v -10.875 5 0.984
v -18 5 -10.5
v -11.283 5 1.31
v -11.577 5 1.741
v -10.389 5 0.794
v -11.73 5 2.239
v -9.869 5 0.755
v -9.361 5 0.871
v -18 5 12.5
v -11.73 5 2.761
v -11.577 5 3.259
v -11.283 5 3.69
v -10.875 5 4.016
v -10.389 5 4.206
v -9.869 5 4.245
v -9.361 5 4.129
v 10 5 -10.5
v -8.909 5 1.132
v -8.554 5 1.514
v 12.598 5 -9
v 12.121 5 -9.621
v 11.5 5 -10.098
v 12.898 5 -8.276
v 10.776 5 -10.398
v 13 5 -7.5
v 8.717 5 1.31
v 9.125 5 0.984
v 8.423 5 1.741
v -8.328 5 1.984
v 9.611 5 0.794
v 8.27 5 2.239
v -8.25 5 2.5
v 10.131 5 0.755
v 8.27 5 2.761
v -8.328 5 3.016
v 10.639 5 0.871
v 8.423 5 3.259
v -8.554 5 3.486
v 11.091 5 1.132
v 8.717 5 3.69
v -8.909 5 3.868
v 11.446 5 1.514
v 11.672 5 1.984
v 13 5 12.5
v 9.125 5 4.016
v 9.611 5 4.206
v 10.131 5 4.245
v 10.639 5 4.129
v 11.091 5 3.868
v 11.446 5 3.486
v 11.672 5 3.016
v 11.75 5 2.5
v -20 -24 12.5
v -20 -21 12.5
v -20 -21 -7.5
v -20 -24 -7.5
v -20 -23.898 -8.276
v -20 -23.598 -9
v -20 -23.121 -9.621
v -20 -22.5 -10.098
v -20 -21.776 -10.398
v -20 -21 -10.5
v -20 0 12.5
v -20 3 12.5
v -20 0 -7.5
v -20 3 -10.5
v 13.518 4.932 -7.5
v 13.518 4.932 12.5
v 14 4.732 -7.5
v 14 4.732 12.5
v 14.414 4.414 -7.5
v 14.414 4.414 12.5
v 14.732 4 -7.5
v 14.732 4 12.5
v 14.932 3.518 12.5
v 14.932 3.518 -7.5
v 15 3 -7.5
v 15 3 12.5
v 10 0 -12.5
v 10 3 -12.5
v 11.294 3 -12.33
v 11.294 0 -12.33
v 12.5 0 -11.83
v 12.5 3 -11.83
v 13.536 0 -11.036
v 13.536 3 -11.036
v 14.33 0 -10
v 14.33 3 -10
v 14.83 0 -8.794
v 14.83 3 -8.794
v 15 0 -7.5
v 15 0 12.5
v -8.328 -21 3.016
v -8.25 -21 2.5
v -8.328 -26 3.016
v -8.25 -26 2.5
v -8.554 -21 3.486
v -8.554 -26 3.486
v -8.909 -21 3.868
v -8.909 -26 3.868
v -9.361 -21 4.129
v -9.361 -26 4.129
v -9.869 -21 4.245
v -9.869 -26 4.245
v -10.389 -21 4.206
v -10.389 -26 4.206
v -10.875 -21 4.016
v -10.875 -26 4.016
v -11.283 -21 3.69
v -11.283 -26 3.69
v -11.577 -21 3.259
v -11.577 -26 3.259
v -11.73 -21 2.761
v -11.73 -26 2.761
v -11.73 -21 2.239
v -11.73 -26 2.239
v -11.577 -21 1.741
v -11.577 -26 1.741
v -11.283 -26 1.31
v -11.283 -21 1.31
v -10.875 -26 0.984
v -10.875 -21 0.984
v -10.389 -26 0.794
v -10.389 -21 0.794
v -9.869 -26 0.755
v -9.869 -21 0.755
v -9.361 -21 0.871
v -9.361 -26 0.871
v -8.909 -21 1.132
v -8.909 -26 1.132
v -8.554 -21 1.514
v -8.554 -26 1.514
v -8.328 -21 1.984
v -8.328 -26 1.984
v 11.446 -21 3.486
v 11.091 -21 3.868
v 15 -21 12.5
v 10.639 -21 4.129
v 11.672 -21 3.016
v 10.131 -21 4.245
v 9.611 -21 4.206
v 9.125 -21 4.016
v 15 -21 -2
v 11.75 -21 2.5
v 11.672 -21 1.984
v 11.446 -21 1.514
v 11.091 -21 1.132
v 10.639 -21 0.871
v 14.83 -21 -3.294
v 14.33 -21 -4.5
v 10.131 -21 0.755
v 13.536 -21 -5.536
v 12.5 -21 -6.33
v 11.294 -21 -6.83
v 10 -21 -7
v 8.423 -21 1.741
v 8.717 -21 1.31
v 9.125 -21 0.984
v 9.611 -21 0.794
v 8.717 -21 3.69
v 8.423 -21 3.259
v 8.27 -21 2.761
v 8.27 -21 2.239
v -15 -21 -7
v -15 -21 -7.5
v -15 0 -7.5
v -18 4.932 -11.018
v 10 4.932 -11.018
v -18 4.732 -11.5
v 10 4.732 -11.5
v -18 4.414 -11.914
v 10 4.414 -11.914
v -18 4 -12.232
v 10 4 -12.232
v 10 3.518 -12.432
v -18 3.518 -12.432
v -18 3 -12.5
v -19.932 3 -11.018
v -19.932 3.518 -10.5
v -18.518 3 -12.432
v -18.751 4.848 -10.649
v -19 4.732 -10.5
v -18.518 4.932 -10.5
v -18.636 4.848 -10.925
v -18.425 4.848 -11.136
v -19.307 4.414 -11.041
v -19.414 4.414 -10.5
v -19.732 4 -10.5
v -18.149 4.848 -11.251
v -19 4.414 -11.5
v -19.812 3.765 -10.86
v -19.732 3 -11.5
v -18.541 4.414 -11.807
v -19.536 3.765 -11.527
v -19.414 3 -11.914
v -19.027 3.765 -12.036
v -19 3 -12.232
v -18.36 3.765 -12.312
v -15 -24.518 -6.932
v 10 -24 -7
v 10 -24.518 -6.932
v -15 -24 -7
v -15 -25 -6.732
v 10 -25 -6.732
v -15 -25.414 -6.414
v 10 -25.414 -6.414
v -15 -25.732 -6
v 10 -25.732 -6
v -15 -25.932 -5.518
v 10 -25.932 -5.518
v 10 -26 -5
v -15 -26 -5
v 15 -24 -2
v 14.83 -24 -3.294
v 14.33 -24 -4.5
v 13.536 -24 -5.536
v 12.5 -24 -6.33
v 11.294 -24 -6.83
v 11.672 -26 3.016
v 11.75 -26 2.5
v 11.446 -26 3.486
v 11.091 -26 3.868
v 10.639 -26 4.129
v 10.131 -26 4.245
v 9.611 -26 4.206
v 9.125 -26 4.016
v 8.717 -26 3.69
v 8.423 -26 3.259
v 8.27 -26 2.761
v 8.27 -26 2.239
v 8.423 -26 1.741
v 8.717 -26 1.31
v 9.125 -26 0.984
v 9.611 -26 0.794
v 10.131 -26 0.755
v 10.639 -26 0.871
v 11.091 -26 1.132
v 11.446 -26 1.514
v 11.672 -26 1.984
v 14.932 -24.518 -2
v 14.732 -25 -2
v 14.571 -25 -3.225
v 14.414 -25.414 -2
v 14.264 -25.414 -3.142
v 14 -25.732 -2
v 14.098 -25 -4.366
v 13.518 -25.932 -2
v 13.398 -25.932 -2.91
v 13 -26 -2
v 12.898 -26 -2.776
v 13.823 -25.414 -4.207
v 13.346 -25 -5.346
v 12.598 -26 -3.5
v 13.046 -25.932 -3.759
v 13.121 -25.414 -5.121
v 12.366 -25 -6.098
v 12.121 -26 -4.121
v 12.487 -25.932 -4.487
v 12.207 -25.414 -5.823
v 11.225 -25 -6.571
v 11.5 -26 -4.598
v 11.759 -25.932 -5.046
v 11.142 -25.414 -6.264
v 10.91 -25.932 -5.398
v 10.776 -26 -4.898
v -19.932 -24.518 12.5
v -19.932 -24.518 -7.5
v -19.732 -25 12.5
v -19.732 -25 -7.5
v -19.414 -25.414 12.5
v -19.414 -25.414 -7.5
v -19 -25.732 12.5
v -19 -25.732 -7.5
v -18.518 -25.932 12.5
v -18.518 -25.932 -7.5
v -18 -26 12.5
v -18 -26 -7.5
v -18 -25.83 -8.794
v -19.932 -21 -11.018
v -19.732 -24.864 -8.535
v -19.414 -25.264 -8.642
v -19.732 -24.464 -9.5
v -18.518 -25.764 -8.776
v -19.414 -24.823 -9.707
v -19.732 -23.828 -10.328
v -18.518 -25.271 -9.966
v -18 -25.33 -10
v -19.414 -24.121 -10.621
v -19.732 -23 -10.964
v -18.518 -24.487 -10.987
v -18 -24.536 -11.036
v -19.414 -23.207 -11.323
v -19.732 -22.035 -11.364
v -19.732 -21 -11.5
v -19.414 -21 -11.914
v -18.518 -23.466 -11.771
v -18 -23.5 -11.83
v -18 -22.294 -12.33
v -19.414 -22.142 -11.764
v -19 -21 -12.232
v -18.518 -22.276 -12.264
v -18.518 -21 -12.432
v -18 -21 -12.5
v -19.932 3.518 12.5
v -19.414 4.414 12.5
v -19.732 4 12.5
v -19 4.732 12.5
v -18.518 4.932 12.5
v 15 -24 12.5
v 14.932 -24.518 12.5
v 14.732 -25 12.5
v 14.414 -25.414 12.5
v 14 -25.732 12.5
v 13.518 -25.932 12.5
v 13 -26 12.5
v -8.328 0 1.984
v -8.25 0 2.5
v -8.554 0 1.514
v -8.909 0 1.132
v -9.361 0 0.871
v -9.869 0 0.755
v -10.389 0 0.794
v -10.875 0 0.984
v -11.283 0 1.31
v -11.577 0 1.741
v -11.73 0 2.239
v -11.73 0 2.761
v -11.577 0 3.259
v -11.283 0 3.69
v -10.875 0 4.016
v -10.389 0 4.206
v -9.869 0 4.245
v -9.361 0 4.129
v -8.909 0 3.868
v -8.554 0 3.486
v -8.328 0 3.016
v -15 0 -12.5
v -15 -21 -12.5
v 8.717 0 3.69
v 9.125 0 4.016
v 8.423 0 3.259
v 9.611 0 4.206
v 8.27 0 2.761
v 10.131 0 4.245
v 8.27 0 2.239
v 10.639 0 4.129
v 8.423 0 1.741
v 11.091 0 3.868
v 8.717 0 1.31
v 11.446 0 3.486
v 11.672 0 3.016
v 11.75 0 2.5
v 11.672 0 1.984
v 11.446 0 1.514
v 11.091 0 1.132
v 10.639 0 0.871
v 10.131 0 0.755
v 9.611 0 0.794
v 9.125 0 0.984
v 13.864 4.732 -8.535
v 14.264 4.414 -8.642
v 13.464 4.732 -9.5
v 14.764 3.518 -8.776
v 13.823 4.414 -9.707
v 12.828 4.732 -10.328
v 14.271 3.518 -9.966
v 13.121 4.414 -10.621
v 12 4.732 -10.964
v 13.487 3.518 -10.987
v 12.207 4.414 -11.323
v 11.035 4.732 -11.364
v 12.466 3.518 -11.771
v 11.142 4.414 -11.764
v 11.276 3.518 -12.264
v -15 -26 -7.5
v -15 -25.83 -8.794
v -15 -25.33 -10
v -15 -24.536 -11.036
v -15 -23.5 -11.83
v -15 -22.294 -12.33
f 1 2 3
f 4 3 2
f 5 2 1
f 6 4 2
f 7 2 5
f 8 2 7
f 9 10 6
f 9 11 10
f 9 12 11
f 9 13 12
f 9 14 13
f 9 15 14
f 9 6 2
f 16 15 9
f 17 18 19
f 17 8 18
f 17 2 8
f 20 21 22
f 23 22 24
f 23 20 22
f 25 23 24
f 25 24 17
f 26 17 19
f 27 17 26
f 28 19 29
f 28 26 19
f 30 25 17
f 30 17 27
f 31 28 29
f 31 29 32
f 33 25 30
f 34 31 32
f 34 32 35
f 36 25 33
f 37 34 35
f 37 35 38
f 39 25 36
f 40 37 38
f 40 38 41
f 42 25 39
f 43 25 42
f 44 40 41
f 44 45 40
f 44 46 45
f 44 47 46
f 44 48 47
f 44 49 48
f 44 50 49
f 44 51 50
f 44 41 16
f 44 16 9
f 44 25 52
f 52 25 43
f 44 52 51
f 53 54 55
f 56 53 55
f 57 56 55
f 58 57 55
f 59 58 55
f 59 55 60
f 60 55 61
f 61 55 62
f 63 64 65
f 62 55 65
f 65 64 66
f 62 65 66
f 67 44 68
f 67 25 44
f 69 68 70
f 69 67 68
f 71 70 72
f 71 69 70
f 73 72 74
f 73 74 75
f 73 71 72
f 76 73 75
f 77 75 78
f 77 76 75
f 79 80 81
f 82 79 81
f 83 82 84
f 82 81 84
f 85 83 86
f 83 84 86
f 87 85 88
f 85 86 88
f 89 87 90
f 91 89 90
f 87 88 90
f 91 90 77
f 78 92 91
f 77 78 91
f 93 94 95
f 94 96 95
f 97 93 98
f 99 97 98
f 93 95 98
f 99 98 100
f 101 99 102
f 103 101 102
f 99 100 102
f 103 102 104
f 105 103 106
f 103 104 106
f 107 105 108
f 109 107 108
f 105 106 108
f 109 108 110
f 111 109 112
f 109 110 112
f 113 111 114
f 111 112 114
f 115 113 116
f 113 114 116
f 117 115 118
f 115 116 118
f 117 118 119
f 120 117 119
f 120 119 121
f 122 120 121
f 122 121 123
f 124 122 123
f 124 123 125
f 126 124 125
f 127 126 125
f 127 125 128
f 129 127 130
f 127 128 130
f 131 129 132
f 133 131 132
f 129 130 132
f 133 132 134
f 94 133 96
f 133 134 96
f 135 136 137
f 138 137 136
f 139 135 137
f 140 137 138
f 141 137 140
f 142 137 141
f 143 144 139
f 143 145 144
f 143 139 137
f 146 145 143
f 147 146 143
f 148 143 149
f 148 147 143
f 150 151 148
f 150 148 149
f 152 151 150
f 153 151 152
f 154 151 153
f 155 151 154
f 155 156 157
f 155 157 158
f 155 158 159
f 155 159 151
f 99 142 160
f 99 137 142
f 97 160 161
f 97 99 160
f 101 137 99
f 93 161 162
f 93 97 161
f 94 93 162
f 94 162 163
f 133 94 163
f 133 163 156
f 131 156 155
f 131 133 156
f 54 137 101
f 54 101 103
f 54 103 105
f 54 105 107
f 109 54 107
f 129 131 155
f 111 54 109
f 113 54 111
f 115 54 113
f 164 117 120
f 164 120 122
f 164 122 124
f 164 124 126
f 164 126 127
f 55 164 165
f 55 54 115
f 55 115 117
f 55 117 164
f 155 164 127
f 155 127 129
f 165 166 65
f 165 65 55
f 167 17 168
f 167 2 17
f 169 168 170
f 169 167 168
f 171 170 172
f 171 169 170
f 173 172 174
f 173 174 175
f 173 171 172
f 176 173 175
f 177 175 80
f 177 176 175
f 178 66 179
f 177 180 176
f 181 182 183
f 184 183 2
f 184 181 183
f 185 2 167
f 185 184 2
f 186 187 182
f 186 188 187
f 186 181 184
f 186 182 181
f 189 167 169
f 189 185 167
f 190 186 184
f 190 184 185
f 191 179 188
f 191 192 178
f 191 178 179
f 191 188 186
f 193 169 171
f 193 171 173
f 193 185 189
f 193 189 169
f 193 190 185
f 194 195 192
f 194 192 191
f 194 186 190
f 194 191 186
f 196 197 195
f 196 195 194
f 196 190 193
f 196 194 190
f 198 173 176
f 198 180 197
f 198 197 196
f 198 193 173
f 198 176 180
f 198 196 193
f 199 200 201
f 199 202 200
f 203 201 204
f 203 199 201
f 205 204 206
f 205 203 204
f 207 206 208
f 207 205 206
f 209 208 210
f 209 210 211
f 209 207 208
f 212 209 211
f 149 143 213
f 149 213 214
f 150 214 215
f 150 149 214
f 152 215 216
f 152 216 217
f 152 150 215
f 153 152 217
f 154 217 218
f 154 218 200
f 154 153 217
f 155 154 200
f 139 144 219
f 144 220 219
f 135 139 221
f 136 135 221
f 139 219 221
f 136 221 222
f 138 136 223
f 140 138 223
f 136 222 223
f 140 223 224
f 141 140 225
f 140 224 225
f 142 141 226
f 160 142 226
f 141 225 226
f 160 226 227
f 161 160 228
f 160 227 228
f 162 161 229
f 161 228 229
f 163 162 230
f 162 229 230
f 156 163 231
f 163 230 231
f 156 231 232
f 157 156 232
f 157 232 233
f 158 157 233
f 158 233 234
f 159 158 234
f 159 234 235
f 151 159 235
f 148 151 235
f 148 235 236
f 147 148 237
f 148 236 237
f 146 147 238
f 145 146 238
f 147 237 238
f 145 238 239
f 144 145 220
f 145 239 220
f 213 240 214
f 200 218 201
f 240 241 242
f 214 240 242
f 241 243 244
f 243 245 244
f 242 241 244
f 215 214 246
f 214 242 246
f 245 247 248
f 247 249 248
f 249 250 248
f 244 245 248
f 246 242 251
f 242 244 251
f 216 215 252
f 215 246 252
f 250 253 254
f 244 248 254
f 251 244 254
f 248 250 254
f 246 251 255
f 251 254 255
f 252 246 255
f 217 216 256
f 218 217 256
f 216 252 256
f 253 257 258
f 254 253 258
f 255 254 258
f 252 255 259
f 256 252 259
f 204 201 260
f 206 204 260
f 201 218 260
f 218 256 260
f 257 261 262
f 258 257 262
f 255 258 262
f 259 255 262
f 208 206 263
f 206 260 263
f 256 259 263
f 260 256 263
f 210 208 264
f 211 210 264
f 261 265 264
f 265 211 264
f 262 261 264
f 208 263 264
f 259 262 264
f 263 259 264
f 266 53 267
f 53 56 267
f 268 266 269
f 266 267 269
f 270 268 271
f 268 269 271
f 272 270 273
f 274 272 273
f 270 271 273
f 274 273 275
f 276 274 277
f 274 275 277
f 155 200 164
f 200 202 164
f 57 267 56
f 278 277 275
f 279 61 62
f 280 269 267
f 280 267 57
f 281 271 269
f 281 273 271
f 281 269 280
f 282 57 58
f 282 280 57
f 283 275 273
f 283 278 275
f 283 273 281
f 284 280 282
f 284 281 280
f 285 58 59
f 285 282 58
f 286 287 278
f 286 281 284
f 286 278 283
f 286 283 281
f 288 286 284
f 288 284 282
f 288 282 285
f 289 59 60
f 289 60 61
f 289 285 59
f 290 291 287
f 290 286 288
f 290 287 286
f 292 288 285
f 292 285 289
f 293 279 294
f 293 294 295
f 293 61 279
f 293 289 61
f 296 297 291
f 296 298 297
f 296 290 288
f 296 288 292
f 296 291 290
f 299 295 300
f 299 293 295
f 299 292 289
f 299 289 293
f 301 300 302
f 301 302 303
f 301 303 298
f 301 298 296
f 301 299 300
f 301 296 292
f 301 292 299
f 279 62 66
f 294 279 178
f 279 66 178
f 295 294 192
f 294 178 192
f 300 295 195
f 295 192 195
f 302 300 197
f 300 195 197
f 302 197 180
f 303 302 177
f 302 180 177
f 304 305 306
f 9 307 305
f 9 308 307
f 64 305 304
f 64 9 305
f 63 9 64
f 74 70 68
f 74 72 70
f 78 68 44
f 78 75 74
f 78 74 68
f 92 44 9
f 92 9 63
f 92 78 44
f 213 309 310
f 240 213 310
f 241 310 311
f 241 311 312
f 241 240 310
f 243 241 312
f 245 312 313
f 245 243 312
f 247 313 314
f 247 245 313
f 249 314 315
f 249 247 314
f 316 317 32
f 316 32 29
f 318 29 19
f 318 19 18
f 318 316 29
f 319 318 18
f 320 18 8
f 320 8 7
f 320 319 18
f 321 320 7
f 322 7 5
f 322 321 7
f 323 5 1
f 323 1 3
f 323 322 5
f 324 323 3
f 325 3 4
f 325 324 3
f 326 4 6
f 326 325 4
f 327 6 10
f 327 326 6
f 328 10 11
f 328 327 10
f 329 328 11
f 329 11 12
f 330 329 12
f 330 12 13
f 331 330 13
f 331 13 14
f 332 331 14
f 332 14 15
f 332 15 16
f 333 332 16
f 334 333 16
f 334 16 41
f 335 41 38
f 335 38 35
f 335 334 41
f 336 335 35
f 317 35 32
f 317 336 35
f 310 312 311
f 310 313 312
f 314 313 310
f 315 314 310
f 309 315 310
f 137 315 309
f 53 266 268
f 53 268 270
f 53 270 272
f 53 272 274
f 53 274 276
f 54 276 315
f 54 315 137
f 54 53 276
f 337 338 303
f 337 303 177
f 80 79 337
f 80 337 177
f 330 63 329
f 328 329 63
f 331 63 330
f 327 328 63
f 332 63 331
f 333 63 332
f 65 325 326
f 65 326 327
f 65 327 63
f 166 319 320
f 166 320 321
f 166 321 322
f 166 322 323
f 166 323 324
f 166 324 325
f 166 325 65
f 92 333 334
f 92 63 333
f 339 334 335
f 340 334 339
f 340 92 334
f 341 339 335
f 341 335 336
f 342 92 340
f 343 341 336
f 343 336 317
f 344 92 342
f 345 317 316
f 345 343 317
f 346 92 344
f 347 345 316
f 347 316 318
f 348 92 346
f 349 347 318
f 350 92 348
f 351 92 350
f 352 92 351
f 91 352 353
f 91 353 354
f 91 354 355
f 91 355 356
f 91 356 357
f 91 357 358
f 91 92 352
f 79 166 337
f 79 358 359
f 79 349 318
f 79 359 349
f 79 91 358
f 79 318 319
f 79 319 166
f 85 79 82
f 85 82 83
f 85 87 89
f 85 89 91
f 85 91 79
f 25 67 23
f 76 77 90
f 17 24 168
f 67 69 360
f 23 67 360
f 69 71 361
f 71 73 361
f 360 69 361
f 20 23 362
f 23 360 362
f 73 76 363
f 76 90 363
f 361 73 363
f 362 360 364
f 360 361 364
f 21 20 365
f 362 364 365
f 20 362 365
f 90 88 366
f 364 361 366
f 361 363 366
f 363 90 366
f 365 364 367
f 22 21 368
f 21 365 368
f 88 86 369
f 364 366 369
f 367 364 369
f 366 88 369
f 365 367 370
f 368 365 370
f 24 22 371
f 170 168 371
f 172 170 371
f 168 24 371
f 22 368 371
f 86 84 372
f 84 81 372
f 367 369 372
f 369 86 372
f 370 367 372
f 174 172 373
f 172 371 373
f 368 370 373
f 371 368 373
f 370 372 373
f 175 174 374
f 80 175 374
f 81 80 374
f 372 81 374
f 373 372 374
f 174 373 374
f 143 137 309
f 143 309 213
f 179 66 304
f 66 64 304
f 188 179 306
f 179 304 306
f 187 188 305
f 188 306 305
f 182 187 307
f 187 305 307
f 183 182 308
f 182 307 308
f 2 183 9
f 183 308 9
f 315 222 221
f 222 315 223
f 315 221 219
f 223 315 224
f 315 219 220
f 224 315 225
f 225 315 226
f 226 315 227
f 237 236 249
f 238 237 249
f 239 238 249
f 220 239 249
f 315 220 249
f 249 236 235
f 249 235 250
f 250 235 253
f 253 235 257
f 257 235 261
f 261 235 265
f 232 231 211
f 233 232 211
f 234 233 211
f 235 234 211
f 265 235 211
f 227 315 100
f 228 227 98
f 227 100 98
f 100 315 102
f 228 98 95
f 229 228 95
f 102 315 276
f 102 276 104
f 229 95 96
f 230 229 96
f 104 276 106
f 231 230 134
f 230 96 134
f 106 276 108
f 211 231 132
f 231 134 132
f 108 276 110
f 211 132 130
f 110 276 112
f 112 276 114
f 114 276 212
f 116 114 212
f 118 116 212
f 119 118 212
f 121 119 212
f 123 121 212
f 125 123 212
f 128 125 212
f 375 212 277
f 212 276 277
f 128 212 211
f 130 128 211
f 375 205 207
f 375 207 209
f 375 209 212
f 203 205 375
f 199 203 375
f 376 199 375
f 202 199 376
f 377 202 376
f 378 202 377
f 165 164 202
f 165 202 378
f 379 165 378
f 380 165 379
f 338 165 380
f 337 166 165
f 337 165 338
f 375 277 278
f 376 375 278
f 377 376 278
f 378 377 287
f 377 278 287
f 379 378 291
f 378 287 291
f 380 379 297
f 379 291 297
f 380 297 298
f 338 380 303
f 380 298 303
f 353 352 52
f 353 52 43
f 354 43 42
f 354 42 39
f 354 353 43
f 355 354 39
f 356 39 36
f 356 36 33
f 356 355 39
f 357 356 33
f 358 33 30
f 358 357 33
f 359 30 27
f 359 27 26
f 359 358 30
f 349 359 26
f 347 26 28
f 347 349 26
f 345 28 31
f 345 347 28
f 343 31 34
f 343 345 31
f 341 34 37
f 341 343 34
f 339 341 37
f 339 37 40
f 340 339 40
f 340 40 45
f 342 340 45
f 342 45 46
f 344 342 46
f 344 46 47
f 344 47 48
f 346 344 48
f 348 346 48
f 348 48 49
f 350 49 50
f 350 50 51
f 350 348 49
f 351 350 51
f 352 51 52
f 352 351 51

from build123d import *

# Parameters (mm, degrees)
SKETCH1_W           = 30
SKETCH1_H           = 25
SKETCH1_R           = 1.75
BOSS_EXTRUDE1_DEPTH = 5
BOSS_EXTRUDE2_DEPTH = 5
SKETCH3_W           = 19.5
SKETCH3_H           = 5
BOSS_EXTRUDE3_DEPTH = 30
SKETCH4_R           = 1.75
CUT_EXTRUDE1_DEPTH  = 32
FILLET1_R           = 5
FILLET2_R           = 2


with BuildPart() as part:
    # Sketch1 → Boss-Extrude1 (new body)
    with BuildSketch(Plane(origin=(0, 0, 0), x_dir=(1, 0, 0), z_dir=(0, 1, 0))):
        Rectangle(SKETCH1_W, SKETCH1_H)
        with Locations((-10, -2.5)):
            Circle(SKETCH1_R, mode=Mode.SUBTRACT)
        with Locations((10, -2.5)):
            Circle(SKETCH1_R, mode=Mode.SUBTRACT)
    extrude(amount=BOSS_EXTRUDE1_DEPTH)

    # Sketch2 → Boss-Extrude2 (add)
    with BuildSketch(Plane.ZY.offset(15)):
        Polygon((-12.5, 5), (12.5, 5), (12.5, 0), (-7.5, 0), (-7.5, -21), (12.5, -21), (12.5, -26), (-12.5, -26), align=None)
    extrude(amount=BOSS_EXTRUDE2_DEPTH)

    # Sketch3 → Boss-Extrude3 (add)
    with BuildSketch(Plane(origin=(-15, 0, 0), x_dir=(0, 0, -1), z_dir=(1, 0, 0))):
        with Locations((-2.75, -23.5)):
            Rectangle(SKETCH3_W, SKETCH3_H)
    extrude(amount=BOSS_EXTRUDE3_DEPTH)

    # Sketch4 → Cut-Extrude1 (cut, through all)
    with BuildSketch(Plane.XZ.offset(26)):
        with Locations((-10, 2.5)):
            Circle(SKETCH4_R)
        with Locations((10, 2.5)):
            Circle(SKETCH4_R)
    extrude(amount=-CUT_EXTRUDE1_DEPTH, mode=Mode.SUBTRACT)

    # Fillet1
    fillet1_edges = [part.edges().sort_by_distance(p)[0] for p in [
        (-17.5, -26, -12.5),
        (15, -23.5, -7),
        (15, 2.5, -12.5),
    ]]
    fillet(fillet1_edges, radius=FILLET1_R)

    # Fillet2
    fillet2_edges = [part.edges().sort_by_distance(p)[0] for p in [
        (-20, -8, -12.5),
        (-20, 5, 0),
        (15, -26, 5.25),
        (15, 5, 2.5),
        (-2.5, -26, -7),
        (-20, -26, 2.5),
        (13.535533906, -26, -5.535533906),
        (-5, 5, -12.5),
        (-20, -24.535533906, -11.035533906),
        (13.535533906, 5, -11.035533906),
    ]]
    fillet(fillet2_edges, radius=FILLET2_R)


solid = part.part
